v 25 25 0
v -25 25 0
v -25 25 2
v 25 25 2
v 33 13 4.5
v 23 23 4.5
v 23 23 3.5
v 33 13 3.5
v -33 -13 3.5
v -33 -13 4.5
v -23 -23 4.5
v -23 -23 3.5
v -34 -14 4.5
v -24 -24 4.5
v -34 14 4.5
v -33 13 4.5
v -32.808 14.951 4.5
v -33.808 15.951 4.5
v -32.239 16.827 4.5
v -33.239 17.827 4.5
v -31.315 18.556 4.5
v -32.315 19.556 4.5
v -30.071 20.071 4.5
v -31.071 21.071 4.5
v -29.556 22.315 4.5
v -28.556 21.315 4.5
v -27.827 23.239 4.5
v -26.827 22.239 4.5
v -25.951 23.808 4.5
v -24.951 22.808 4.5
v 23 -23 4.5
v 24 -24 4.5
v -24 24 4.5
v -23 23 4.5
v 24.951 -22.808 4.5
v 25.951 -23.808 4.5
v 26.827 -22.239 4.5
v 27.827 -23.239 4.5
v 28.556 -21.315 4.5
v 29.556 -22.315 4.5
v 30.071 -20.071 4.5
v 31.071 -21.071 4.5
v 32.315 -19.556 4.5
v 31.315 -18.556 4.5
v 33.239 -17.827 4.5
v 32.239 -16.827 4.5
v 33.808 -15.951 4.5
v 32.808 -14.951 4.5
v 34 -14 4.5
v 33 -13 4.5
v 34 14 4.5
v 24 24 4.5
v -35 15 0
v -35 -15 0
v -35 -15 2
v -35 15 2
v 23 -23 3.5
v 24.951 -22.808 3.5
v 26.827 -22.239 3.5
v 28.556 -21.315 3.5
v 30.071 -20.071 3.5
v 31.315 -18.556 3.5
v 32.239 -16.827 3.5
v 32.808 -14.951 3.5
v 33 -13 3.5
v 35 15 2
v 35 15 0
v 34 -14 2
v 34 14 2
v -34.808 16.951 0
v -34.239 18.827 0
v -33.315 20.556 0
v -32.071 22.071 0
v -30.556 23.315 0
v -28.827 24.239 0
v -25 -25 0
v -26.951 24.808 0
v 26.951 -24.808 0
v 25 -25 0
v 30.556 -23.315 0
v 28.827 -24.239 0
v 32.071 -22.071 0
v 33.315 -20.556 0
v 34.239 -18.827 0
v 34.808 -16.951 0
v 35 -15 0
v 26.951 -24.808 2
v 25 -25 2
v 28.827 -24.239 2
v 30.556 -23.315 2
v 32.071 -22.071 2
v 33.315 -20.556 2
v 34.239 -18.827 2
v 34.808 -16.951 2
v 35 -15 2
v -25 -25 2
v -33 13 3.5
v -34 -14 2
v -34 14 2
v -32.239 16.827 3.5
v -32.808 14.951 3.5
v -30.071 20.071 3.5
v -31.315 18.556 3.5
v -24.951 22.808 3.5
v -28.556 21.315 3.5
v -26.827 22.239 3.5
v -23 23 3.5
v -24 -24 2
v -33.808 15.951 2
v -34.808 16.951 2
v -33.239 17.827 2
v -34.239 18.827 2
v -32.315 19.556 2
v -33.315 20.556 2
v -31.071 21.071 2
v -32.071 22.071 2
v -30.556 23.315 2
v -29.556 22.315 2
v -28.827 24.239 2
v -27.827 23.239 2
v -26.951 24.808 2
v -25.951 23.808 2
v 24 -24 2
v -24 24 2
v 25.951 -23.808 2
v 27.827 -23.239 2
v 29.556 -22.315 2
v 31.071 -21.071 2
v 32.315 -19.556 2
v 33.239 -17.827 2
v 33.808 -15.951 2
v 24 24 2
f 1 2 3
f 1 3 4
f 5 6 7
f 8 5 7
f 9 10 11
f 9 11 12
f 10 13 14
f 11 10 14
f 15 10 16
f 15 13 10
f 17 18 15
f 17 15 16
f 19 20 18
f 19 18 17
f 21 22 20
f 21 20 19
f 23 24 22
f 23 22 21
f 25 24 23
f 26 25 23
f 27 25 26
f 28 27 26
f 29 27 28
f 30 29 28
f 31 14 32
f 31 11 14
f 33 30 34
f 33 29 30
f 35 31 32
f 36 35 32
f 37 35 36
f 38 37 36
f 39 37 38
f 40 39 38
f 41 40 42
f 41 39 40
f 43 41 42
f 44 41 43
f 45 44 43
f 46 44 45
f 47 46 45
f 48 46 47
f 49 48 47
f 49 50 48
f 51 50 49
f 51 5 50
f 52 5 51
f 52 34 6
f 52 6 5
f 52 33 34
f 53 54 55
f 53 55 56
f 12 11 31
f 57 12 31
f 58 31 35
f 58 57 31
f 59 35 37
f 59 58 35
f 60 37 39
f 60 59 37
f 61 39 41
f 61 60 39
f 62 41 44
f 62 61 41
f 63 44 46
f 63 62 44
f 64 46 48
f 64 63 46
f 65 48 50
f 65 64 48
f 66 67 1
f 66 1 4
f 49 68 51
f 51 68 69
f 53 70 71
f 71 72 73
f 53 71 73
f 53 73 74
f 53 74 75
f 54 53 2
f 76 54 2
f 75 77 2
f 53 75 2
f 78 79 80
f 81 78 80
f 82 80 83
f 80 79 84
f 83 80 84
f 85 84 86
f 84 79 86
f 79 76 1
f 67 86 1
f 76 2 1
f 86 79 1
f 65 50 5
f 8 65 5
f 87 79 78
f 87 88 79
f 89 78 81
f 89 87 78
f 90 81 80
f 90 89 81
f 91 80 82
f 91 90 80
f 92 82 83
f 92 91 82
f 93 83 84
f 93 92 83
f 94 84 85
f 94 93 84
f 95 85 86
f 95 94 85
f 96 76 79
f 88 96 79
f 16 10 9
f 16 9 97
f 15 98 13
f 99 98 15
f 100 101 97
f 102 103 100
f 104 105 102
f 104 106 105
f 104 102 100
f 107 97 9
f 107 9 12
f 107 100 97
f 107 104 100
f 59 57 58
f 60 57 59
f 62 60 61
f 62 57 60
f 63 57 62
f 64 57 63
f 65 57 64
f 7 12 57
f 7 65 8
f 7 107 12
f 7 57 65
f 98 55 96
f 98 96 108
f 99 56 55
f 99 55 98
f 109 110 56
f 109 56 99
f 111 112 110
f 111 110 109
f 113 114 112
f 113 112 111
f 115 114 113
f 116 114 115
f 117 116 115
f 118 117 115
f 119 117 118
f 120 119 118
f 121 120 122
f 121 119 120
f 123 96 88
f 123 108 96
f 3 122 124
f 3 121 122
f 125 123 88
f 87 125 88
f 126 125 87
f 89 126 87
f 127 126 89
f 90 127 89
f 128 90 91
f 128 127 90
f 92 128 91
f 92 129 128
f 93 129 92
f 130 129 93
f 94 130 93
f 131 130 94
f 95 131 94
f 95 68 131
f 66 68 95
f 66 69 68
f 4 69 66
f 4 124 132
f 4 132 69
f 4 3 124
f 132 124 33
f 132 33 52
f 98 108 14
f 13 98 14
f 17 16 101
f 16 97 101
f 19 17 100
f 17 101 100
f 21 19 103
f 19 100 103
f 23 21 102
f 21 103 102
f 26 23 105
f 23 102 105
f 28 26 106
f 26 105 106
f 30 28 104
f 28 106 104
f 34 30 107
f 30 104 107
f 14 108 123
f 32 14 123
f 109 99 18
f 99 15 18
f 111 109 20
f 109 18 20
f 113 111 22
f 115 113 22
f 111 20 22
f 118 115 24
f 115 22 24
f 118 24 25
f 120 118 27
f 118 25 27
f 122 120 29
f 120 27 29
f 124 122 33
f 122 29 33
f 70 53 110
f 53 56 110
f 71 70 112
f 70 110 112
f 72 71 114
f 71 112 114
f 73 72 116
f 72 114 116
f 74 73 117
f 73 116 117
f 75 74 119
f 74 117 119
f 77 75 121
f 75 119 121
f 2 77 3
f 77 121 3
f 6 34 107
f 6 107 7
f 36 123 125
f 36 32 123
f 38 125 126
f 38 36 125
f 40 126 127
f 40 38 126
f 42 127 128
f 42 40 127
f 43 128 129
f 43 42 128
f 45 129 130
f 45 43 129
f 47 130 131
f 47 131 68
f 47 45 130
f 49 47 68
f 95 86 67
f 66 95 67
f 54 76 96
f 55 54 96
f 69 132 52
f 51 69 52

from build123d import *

# Parameters (mm, degrees)
F0_W     = 70
F0_H     = 50
F1_DEPTH = 2
F2_W     = 68
F2_H     = 48
F3_DEPTH = 2.5
F4_W     = 66
F4_H     = 46
F5_DEPTH = 1
F6_SIZE  = 10
F7_R     = 10


with BuildPart() as f1:
    # F0 (on Top) → F1 (new body)
    with BuildSketch(Plane.XY):
        Rectangle(F0_W, F0_H)
    extrude(amount=F1_DEPTH)

    # F2 (on face) → F3 (join)
    with BuildSketch(Plane.XY.offset(2)):
        Rectangle(F2_W, F2_H)
    extrude(amount=F3_DEPTH)

    # F4 (on face) → F5 (cut)
    with BuildSketch(Plane.XY.offset(4.5)):
        Rectangle(F4_W, F4_H)
    extrude(amount=-F5_DEPTH, mode=Mode.SUBTRACT)

    # F6
    f6_edges = [f1.edges().sort_by_distance(p)[0] for p in [
        (33, 23, 4),
        (34, 24, 3.25),
        (35, 25, 1),
        (-33, -23, 4),
        (-34, -24, 3.25),
        (-35, -25, 1),
    ]]
    chamfer(f6_edges, length=F6_SIZE)

    # F7
    f7_edges = [f1.edges().sort_by_distance(p)[0] for p in [
        (33, -23, 4),
        (34, -24, 3.25),
        (35, -25, 1),
        (-33, 23, 4),
        (-34, 24, 3.25),
        (-35, 25, 1),
    ]]
    fillet(f7_edges, radius=F7_R)


solid = f1.part
